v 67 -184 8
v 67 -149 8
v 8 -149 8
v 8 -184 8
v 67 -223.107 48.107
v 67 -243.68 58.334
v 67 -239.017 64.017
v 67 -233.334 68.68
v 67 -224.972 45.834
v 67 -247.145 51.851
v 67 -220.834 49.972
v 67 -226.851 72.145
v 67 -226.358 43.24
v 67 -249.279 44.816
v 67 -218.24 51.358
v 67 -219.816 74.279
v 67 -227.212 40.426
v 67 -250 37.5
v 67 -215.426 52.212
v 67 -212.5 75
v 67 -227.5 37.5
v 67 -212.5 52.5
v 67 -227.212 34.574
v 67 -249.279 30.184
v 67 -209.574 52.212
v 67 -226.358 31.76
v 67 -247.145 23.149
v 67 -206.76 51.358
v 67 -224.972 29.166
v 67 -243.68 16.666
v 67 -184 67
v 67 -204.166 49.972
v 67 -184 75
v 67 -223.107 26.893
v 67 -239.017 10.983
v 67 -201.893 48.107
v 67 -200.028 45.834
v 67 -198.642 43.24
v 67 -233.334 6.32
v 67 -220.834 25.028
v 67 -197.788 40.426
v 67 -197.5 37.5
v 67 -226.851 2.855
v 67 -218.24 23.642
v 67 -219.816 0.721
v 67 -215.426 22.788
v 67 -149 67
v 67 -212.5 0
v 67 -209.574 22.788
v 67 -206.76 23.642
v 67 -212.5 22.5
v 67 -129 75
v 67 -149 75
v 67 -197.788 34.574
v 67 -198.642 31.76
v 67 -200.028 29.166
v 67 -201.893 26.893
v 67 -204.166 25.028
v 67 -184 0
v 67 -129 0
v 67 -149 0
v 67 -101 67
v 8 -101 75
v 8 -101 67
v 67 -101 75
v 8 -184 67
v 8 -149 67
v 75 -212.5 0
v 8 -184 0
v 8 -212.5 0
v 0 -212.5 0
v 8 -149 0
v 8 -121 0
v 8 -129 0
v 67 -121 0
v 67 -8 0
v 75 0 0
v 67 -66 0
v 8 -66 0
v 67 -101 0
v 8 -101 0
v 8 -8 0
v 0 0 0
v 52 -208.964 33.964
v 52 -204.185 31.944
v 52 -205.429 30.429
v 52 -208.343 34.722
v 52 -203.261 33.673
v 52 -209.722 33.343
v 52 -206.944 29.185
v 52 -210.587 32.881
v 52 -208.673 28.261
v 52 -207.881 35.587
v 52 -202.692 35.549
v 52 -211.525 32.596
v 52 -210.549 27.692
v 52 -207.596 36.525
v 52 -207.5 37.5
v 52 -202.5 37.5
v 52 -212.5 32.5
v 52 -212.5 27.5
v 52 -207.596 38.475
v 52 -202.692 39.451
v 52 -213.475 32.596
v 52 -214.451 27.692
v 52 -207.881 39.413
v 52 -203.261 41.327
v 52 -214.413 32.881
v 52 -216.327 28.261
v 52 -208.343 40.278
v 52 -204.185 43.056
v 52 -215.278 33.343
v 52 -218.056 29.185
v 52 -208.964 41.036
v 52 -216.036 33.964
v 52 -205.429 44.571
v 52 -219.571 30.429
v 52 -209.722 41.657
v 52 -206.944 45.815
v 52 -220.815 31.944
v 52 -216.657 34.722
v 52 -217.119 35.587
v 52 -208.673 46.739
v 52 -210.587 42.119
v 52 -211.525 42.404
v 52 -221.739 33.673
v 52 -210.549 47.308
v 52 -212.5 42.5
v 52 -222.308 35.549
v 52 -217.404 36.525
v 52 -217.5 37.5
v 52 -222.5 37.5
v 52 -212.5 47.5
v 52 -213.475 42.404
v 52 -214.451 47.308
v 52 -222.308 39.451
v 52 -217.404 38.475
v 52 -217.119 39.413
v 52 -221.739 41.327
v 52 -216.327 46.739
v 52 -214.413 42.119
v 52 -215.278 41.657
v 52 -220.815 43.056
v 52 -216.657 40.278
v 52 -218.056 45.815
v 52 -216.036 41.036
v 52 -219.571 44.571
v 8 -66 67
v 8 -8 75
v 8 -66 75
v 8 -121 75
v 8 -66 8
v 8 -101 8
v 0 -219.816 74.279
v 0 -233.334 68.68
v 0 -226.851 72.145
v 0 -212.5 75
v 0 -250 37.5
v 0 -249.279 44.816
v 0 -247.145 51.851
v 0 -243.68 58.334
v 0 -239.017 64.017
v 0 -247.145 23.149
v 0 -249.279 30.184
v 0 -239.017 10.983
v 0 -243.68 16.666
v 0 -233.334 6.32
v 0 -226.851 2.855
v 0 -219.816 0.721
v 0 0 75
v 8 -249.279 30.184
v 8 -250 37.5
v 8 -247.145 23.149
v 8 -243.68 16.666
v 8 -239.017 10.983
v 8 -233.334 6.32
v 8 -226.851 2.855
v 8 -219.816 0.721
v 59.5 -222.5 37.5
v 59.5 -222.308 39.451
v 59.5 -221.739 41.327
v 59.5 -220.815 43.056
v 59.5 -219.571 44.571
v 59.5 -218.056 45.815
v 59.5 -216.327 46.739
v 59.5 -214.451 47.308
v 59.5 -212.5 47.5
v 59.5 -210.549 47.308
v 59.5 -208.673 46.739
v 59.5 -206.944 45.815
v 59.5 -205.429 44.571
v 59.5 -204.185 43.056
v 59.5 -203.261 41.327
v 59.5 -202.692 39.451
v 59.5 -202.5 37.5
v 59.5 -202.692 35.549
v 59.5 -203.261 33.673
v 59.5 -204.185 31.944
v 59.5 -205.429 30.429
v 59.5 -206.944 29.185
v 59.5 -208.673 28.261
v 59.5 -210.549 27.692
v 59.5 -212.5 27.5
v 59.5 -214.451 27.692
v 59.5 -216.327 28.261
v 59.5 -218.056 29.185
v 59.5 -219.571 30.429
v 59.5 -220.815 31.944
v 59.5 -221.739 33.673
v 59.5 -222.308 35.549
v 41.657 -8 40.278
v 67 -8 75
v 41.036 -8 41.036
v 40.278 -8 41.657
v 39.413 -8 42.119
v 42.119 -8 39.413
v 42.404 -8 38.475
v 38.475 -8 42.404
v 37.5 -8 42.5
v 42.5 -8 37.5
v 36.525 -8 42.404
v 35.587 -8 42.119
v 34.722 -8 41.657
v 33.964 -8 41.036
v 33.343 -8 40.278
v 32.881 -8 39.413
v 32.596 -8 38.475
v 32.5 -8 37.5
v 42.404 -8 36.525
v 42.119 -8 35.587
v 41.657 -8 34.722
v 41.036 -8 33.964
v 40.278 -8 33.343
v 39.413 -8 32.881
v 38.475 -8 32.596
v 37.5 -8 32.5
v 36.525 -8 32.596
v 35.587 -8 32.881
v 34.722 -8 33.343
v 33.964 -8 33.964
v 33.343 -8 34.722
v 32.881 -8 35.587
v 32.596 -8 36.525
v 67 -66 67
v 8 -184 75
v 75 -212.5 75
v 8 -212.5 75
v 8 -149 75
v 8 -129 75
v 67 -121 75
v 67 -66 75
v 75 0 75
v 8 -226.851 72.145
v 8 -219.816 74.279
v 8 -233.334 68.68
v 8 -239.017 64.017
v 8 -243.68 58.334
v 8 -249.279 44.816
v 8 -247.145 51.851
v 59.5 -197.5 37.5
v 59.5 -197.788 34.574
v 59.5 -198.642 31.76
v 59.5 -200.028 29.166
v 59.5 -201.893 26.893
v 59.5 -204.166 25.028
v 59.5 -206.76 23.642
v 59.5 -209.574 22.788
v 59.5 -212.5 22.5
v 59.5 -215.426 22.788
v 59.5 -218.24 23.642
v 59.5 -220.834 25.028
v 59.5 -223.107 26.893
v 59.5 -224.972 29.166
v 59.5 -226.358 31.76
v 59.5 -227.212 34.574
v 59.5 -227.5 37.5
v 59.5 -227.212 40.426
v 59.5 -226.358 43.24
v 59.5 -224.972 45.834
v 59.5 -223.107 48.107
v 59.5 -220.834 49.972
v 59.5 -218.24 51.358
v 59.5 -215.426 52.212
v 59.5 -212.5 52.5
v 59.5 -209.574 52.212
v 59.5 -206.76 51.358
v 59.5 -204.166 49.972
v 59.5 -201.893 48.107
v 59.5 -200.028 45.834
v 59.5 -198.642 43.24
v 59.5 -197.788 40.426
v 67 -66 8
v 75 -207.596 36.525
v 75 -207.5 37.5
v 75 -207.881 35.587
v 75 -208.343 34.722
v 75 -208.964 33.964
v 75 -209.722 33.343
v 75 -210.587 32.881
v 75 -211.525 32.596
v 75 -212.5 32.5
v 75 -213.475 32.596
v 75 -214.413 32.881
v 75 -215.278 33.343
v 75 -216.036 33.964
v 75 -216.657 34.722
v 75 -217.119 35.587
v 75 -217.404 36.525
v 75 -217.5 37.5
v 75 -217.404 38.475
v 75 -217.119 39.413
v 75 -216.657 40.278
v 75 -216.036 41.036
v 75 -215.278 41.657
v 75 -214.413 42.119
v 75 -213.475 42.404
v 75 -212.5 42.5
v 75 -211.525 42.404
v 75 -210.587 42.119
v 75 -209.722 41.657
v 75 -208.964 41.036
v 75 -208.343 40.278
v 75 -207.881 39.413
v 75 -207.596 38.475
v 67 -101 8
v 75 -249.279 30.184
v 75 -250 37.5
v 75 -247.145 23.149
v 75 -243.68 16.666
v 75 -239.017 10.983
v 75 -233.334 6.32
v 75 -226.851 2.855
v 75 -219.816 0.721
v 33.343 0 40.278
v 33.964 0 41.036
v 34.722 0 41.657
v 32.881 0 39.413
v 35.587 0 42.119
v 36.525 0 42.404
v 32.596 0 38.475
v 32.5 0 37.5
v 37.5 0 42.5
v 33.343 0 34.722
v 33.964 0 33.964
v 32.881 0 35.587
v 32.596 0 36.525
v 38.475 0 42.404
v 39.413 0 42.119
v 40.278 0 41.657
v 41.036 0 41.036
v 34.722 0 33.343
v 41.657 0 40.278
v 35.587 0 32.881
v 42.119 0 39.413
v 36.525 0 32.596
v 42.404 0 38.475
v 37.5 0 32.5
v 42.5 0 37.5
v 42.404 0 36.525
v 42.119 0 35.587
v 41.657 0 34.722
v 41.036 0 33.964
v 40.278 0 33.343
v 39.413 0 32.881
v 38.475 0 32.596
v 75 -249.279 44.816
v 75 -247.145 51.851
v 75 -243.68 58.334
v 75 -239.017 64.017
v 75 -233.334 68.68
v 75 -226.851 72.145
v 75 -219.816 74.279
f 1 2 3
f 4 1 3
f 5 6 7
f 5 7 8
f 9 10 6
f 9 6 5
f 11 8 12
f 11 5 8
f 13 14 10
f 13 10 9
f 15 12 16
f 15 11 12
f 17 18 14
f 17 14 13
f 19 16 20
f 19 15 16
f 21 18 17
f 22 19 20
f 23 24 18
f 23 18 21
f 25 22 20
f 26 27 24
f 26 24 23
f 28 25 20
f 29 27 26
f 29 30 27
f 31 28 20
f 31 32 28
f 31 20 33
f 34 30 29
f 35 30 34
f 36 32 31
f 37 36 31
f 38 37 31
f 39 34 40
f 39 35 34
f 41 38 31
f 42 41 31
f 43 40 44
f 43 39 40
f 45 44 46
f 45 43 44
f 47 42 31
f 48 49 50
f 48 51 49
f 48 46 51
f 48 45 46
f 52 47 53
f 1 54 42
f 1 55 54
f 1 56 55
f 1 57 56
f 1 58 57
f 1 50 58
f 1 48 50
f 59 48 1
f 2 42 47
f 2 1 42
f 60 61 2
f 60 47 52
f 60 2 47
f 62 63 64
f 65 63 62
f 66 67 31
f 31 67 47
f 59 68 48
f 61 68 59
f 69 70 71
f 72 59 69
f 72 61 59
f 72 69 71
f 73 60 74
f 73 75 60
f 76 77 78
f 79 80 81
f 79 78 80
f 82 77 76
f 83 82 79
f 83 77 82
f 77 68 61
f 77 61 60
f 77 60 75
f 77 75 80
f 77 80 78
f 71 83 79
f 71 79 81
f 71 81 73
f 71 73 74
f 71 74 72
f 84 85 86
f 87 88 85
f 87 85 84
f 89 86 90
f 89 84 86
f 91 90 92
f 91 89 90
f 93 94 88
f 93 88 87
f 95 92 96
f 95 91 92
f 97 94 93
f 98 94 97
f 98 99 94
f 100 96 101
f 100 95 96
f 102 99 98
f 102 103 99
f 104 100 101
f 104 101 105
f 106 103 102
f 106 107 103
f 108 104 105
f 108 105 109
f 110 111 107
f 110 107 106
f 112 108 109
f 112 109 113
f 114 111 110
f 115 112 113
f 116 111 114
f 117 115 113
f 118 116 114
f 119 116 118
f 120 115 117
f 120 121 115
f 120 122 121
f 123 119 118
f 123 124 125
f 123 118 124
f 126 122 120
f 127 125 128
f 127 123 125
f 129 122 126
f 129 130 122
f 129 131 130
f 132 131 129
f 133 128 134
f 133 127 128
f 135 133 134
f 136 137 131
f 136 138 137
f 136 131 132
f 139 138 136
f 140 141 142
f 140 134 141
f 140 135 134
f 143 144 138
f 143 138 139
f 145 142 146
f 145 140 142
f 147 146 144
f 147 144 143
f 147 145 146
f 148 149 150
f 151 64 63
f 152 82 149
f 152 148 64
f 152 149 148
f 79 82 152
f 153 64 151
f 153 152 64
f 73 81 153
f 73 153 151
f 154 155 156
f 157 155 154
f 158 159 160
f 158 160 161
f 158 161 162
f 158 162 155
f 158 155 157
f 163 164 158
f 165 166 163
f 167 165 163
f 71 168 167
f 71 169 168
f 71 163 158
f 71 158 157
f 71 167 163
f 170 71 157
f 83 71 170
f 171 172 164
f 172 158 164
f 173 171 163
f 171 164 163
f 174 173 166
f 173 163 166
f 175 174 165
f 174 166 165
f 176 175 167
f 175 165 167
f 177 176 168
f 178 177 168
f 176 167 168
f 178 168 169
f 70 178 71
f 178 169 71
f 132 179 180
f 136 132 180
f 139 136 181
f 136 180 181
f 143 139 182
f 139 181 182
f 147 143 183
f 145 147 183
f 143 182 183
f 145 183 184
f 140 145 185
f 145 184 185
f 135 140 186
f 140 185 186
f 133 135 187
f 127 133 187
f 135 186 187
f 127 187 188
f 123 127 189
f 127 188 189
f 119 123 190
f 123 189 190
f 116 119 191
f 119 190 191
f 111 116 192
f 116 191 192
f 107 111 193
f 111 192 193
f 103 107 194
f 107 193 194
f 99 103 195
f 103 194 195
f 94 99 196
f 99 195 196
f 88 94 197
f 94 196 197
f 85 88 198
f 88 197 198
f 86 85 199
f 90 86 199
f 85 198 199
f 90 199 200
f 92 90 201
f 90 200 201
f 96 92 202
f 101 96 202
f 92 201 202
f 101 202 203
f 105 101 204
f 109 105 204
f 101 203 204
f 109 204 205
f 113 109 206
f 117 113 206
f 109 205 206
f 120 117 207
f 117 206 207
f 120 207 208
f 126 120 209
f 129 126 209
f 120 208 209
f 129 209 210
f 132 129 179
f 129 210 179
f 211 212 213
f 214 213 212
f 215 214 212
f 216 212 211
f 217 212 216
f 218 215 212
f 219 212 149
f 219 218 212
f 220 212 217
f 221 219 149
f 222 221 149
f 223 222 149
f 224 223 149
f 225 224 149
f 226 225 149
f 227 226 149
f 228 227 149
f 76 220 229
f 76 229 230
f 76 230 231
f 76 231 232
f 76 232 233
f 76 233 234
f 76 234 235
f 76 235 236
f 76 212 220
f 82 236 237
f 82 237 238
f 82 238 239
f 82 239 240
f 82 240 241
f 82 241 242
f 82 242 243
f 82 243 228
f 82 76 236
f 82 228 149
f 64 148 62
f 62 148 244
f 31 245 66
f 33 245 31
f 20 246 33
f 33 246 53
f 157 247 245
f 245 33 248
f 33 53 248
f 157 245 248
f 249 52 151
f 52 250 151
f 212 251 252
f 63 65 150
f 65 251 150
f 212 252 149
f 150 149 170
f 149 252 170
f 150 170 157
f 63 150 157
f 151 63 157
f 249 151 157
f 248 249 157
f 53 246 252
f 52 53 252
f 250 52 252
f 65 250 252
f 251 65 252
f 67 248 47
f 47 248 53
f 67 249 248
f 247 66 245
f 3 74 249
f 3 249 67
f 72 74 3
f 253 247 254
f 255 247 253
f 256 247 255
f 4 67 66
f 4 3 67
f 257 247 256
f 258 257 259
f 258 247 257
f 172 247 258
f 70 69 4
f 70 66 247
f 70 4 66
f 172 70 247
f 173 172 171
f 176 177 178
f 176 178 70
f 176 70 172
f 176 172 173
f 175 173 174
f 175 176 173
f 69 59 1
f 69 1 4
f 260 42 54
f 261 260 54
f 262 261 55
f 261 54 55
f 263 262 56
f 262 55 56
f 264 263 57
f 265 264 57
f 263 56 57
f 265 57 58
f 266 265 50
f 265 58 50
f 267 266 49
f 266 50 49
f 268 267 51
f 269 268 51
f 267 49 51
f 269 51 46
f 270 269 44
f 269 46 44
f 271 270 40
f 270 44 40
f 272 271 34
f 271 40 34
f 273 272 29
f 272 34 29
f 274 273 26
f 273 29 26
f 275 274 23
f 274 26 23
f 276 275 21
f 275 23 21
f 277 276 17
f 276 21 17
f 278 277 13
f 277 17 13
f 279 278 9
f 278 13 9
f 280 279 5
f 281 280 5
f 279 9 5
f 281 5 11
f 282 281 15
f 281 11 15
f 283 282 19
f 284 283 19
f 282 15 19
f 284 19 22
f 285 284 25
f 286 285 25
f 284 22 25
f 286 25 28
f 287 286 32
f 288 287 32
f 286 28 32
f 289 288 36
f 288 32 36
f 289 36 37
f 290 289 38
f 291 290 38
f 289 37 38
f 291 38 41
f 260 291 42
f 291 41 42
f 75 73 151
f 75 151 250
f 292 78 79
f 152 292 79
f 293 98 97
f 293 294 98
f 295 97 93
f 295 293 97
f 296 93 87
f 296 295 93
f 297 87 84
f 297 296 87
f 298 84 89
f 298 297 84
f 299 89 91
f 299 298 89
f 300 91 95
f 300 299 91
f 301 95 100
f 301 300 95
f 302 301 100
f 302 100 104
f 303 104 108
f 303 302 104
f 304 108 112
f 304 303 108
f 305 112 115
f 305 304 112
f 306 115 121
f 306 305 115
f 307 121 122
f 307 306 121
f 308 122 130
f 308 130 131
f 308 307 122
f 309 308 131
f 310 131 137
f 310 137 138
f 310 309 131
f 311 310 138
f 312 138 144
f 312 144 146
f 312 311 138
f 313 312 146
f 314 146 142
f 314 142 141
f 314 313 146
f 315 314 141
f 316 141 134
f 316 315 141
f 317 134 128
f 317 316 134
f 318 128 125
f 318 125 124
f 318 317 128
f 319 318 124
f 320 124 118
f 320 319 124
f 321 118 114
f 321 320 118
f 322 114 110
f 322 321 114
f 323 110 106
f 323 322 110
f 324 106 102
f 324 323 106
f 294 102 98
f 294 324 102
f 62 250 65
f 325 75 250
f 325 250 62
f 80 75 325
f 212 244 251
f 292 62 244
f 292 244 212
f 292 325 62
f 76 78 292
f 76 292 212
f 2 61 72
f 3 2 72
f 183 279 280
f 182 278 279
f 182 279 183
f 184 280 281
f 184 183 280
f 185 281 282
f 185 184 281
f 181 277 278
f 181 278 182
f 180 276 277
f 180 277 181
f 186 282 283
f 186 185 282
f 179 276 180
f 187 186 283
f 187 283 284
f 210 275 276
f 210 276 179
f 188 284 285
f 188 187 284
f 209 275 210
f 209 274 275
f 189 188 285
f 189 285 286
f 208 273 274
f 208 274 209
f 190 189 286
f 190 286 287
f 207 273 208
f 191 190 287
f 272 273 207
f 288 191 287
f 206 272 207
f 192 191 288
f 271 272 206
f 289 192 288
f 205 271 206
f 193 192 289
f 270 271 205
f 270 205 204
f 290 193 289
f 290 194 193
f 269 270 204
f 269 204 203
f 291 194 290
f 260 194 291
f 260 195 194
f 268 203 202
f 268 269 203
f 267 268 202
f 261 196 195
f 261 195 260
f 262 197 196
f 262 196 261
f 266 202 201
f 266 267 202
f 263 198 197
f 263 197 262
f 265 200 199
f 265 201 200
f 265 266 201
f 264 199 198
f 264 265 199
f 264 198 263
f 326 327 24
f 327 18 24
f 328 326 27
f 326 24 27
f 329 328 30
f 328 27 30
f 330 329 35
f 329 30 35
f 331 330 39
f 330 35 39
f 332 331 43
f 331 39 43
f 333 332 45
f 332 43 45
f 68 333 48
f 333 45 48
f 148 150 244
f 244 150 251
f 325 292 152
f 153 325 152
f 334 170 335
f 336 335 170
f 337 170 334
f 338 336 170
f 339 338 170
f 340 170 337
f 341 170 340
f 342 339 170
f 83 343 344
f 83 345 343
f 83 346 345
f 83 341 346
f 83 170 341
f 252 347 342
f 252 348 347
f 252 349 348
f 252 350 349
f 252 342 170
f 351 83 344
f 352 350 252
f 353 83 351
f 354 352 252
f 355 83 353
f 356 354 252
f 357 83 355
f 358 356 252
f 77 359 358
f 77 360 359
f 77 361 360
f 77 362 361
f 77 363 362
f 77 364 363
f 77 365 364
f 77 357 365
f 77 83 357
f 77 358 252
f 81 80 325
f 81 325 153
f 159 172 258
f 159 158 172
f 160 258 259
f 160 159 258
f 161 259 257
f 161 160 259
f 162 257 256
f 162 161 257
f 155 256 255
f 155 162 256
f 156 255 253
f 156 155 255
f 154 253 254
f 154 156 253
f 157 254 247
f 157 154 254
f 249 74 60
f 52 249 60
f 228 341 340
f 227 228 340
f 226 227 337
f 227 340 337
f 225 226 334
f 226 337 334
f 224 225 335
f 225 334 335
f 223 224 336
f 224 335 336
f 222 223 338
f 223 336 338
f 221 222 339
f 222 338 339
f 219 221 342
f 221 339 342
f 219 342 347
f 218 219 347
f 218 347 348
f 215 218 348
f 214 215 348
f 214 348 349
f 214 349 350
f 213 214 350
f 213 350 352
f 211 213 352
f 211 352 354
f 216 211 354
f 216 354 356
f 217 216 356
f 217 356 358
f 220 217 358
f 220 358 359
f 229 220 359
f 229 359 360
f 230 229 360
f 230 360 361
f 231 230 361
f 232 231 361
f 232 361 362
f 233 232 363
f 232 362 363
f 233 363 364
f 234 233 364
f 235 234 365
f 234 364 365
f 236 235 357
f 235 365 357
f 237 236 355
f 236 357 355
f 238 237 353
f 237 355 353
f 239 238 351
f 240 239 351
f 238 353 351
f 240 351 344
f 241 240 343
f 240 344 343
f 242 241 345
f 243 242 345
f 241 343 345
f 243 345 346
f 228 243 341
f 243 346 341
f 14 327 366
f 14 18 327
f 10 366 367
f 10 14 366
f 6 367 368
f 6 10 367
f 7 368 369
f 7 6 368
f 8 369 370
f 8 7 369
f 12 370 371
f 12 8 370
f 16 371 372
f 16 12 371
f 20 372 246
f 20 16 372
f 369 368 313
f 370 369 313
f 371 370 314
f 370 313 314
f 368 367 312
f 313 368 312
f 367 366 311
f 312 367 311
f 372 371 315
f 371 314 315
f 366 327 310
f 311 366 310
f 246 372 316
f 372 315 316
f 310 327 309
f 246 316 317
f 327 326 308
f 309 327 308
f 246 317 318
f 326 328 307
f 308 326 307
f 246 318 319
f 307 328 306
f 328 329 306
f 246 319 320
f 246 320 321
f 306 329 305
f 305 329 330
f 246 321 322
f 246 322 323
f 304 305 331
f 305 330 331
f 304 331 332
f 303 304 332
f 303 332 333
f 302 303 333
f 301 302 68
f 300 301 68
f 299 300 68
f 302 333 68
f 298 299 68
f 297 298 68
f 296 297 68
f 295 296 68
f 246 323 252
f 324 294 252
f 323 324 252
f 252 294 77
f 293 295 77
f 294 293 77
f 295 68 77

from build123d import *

# Parameters (mm, degrees)
SKETCH1_W           = 59
SKETCH1_H           = 8
BOSS_EXTRUDE2_DEPTH = 75
FILLET1_R           = 37.5
SKETCH2_R           = 5
CUT_EXTRUDE1_DEPTH  = 10
SKETCH3_R           = 15
SKETCH3_R_2         = 5
BOSS_EXTRUDE3_DEPTH = 7.5
SKETCH4_R           = 10
SKETCH4_R_2         = 5
BOSS_EXTRUDE4_DEPTH = 7.5
SKETCH5_R           = 5
CUT_EXTRUDE2_DEPTH  = 10
SKETCH6_W           = 75
SKETCH6_H           = 35
BOSS_EXTRUDE5_DEPTH = 8
SKETCH7_W           = 59
SKETCH7_H           = 35
BOSS_EXTRUDE6_DEPTH = 8


with BuildPart() as part:
    # Sketch1 → Boss-Extrude2 (new body)
    with BuildSketch(Plane.XY):
        Polygon((8, -8), (8, -250), (0, -250), (0, 0), (75, 0), (75, -250), (67, -250), (67, -8), align=None)
        with Locations((37.5, -125)):
            Rectangle(SKETCH1_W, SKETCH1_H)
    extrude(amount=BOSS_EXTRUDE2_DEPTH)

    # Fillet1
    fillet1_edges = [part.edges().sort_by_distance(p)[0] for p in [
        (4, -250, 0),
        (71, -250, 0),
        (71, -250, 75),
        (4, -250, 75),
    ]]
    fillet(fillet1_edges, radius=FILLET1_R - 0.0001)  # a hair under: the kernel refuses the full size

    # Sketch2 → Cut-Extrude1 (cut)
    with BuildSketch(Plane(origin=(75, 0, 0), x_dir=(0, 0, -1), z_dir=(1, 0, 0))):
        with Locations(Location((-37.5, -212.5, 0), (0, 0, 90))):
            Circle(SKETCH2_R)
    extrude(amount=-CUT_EXTRUDE1_DEPTH, mode=Mode.SUBTRACT)

    # Sketch3 → Boss-Extrude3 (add)
    with BuildSketch(Plane.ZY.offset(-67)):
        with Locations(Location((37.5, -212.5, 0), (0, 0, 90))):
            Circle(SKETCH3_R)
        with Locations(Location((37.5, -212.5, 0), (0, 0, 90))):
            Circle(SKETCH3_R_2, mode=Mode.SUBTRACT)
    extrude(amount=BOSS_EXTRUDE3_DEPTH)

    # Sketch4 → Boss-Extrude4 (add)
    with BuildSketch(Plane.ZY.offset(-59.5)):
        with Locations(Location((37.5, -212.5, 0), (0, 0, 270))):
            Circle(SKETCH4_R)
        with Locations(Location((37.5, -212.5, 0), (0, 0, 90))):
            Circle(SKETCH4_R_2, mode=Mode.SUBTRACT)
    extrude(amount=BOSS_EXTRUDE4_DEPTH)

    # Sketch5 → Cut-Extrude2 (cut)
    with BuildSketch(Plane(origin=(0, 0, 0), x_dir=(1, 0, 0), z_dir=(0, 1, 0))):
        with Locations(Location((37.5, -37.5, 0), (0, 0, 180))):
            Circle(SKETCH5_R)
    extrude(amount=-CUT_EXTRUDE2_DEPTH, mode=Mode.SUBTRACT)

    # Sketch6 → Boss-Extrude5 (add)
    with BuildSketch(Plane(origin=(0, 0, 0), x_dir=(-1, 0, 0), z_dir=(0, 0, -1))):
        with Locations((-37.5, -83.5)):
            Rectangle(SKETCH6_W, SKETCH6_H)
        with Locations((-37.5, -166.5)):
            Rectangle(SKETCH6_W, SKETCH6_H)
    extrude(amount=-BOSS_EXTRUDE5_DEPTH)

    # Sketch7 → Boss-Extrude6 (add)
    with BuildSketch(Plane.XY.offset(75)):
        with Locations((37.5, -83.5)):
            Rectangle(SKETCH7_W, SKETCH7_H)
        with Locations((37.5, -166.5)):
            Rectangle(SKETCH7_W, SKETCH7_H)
    extrude(amount=-BOSS_EXTRUDE6_DEPTH)


solid = part.part
